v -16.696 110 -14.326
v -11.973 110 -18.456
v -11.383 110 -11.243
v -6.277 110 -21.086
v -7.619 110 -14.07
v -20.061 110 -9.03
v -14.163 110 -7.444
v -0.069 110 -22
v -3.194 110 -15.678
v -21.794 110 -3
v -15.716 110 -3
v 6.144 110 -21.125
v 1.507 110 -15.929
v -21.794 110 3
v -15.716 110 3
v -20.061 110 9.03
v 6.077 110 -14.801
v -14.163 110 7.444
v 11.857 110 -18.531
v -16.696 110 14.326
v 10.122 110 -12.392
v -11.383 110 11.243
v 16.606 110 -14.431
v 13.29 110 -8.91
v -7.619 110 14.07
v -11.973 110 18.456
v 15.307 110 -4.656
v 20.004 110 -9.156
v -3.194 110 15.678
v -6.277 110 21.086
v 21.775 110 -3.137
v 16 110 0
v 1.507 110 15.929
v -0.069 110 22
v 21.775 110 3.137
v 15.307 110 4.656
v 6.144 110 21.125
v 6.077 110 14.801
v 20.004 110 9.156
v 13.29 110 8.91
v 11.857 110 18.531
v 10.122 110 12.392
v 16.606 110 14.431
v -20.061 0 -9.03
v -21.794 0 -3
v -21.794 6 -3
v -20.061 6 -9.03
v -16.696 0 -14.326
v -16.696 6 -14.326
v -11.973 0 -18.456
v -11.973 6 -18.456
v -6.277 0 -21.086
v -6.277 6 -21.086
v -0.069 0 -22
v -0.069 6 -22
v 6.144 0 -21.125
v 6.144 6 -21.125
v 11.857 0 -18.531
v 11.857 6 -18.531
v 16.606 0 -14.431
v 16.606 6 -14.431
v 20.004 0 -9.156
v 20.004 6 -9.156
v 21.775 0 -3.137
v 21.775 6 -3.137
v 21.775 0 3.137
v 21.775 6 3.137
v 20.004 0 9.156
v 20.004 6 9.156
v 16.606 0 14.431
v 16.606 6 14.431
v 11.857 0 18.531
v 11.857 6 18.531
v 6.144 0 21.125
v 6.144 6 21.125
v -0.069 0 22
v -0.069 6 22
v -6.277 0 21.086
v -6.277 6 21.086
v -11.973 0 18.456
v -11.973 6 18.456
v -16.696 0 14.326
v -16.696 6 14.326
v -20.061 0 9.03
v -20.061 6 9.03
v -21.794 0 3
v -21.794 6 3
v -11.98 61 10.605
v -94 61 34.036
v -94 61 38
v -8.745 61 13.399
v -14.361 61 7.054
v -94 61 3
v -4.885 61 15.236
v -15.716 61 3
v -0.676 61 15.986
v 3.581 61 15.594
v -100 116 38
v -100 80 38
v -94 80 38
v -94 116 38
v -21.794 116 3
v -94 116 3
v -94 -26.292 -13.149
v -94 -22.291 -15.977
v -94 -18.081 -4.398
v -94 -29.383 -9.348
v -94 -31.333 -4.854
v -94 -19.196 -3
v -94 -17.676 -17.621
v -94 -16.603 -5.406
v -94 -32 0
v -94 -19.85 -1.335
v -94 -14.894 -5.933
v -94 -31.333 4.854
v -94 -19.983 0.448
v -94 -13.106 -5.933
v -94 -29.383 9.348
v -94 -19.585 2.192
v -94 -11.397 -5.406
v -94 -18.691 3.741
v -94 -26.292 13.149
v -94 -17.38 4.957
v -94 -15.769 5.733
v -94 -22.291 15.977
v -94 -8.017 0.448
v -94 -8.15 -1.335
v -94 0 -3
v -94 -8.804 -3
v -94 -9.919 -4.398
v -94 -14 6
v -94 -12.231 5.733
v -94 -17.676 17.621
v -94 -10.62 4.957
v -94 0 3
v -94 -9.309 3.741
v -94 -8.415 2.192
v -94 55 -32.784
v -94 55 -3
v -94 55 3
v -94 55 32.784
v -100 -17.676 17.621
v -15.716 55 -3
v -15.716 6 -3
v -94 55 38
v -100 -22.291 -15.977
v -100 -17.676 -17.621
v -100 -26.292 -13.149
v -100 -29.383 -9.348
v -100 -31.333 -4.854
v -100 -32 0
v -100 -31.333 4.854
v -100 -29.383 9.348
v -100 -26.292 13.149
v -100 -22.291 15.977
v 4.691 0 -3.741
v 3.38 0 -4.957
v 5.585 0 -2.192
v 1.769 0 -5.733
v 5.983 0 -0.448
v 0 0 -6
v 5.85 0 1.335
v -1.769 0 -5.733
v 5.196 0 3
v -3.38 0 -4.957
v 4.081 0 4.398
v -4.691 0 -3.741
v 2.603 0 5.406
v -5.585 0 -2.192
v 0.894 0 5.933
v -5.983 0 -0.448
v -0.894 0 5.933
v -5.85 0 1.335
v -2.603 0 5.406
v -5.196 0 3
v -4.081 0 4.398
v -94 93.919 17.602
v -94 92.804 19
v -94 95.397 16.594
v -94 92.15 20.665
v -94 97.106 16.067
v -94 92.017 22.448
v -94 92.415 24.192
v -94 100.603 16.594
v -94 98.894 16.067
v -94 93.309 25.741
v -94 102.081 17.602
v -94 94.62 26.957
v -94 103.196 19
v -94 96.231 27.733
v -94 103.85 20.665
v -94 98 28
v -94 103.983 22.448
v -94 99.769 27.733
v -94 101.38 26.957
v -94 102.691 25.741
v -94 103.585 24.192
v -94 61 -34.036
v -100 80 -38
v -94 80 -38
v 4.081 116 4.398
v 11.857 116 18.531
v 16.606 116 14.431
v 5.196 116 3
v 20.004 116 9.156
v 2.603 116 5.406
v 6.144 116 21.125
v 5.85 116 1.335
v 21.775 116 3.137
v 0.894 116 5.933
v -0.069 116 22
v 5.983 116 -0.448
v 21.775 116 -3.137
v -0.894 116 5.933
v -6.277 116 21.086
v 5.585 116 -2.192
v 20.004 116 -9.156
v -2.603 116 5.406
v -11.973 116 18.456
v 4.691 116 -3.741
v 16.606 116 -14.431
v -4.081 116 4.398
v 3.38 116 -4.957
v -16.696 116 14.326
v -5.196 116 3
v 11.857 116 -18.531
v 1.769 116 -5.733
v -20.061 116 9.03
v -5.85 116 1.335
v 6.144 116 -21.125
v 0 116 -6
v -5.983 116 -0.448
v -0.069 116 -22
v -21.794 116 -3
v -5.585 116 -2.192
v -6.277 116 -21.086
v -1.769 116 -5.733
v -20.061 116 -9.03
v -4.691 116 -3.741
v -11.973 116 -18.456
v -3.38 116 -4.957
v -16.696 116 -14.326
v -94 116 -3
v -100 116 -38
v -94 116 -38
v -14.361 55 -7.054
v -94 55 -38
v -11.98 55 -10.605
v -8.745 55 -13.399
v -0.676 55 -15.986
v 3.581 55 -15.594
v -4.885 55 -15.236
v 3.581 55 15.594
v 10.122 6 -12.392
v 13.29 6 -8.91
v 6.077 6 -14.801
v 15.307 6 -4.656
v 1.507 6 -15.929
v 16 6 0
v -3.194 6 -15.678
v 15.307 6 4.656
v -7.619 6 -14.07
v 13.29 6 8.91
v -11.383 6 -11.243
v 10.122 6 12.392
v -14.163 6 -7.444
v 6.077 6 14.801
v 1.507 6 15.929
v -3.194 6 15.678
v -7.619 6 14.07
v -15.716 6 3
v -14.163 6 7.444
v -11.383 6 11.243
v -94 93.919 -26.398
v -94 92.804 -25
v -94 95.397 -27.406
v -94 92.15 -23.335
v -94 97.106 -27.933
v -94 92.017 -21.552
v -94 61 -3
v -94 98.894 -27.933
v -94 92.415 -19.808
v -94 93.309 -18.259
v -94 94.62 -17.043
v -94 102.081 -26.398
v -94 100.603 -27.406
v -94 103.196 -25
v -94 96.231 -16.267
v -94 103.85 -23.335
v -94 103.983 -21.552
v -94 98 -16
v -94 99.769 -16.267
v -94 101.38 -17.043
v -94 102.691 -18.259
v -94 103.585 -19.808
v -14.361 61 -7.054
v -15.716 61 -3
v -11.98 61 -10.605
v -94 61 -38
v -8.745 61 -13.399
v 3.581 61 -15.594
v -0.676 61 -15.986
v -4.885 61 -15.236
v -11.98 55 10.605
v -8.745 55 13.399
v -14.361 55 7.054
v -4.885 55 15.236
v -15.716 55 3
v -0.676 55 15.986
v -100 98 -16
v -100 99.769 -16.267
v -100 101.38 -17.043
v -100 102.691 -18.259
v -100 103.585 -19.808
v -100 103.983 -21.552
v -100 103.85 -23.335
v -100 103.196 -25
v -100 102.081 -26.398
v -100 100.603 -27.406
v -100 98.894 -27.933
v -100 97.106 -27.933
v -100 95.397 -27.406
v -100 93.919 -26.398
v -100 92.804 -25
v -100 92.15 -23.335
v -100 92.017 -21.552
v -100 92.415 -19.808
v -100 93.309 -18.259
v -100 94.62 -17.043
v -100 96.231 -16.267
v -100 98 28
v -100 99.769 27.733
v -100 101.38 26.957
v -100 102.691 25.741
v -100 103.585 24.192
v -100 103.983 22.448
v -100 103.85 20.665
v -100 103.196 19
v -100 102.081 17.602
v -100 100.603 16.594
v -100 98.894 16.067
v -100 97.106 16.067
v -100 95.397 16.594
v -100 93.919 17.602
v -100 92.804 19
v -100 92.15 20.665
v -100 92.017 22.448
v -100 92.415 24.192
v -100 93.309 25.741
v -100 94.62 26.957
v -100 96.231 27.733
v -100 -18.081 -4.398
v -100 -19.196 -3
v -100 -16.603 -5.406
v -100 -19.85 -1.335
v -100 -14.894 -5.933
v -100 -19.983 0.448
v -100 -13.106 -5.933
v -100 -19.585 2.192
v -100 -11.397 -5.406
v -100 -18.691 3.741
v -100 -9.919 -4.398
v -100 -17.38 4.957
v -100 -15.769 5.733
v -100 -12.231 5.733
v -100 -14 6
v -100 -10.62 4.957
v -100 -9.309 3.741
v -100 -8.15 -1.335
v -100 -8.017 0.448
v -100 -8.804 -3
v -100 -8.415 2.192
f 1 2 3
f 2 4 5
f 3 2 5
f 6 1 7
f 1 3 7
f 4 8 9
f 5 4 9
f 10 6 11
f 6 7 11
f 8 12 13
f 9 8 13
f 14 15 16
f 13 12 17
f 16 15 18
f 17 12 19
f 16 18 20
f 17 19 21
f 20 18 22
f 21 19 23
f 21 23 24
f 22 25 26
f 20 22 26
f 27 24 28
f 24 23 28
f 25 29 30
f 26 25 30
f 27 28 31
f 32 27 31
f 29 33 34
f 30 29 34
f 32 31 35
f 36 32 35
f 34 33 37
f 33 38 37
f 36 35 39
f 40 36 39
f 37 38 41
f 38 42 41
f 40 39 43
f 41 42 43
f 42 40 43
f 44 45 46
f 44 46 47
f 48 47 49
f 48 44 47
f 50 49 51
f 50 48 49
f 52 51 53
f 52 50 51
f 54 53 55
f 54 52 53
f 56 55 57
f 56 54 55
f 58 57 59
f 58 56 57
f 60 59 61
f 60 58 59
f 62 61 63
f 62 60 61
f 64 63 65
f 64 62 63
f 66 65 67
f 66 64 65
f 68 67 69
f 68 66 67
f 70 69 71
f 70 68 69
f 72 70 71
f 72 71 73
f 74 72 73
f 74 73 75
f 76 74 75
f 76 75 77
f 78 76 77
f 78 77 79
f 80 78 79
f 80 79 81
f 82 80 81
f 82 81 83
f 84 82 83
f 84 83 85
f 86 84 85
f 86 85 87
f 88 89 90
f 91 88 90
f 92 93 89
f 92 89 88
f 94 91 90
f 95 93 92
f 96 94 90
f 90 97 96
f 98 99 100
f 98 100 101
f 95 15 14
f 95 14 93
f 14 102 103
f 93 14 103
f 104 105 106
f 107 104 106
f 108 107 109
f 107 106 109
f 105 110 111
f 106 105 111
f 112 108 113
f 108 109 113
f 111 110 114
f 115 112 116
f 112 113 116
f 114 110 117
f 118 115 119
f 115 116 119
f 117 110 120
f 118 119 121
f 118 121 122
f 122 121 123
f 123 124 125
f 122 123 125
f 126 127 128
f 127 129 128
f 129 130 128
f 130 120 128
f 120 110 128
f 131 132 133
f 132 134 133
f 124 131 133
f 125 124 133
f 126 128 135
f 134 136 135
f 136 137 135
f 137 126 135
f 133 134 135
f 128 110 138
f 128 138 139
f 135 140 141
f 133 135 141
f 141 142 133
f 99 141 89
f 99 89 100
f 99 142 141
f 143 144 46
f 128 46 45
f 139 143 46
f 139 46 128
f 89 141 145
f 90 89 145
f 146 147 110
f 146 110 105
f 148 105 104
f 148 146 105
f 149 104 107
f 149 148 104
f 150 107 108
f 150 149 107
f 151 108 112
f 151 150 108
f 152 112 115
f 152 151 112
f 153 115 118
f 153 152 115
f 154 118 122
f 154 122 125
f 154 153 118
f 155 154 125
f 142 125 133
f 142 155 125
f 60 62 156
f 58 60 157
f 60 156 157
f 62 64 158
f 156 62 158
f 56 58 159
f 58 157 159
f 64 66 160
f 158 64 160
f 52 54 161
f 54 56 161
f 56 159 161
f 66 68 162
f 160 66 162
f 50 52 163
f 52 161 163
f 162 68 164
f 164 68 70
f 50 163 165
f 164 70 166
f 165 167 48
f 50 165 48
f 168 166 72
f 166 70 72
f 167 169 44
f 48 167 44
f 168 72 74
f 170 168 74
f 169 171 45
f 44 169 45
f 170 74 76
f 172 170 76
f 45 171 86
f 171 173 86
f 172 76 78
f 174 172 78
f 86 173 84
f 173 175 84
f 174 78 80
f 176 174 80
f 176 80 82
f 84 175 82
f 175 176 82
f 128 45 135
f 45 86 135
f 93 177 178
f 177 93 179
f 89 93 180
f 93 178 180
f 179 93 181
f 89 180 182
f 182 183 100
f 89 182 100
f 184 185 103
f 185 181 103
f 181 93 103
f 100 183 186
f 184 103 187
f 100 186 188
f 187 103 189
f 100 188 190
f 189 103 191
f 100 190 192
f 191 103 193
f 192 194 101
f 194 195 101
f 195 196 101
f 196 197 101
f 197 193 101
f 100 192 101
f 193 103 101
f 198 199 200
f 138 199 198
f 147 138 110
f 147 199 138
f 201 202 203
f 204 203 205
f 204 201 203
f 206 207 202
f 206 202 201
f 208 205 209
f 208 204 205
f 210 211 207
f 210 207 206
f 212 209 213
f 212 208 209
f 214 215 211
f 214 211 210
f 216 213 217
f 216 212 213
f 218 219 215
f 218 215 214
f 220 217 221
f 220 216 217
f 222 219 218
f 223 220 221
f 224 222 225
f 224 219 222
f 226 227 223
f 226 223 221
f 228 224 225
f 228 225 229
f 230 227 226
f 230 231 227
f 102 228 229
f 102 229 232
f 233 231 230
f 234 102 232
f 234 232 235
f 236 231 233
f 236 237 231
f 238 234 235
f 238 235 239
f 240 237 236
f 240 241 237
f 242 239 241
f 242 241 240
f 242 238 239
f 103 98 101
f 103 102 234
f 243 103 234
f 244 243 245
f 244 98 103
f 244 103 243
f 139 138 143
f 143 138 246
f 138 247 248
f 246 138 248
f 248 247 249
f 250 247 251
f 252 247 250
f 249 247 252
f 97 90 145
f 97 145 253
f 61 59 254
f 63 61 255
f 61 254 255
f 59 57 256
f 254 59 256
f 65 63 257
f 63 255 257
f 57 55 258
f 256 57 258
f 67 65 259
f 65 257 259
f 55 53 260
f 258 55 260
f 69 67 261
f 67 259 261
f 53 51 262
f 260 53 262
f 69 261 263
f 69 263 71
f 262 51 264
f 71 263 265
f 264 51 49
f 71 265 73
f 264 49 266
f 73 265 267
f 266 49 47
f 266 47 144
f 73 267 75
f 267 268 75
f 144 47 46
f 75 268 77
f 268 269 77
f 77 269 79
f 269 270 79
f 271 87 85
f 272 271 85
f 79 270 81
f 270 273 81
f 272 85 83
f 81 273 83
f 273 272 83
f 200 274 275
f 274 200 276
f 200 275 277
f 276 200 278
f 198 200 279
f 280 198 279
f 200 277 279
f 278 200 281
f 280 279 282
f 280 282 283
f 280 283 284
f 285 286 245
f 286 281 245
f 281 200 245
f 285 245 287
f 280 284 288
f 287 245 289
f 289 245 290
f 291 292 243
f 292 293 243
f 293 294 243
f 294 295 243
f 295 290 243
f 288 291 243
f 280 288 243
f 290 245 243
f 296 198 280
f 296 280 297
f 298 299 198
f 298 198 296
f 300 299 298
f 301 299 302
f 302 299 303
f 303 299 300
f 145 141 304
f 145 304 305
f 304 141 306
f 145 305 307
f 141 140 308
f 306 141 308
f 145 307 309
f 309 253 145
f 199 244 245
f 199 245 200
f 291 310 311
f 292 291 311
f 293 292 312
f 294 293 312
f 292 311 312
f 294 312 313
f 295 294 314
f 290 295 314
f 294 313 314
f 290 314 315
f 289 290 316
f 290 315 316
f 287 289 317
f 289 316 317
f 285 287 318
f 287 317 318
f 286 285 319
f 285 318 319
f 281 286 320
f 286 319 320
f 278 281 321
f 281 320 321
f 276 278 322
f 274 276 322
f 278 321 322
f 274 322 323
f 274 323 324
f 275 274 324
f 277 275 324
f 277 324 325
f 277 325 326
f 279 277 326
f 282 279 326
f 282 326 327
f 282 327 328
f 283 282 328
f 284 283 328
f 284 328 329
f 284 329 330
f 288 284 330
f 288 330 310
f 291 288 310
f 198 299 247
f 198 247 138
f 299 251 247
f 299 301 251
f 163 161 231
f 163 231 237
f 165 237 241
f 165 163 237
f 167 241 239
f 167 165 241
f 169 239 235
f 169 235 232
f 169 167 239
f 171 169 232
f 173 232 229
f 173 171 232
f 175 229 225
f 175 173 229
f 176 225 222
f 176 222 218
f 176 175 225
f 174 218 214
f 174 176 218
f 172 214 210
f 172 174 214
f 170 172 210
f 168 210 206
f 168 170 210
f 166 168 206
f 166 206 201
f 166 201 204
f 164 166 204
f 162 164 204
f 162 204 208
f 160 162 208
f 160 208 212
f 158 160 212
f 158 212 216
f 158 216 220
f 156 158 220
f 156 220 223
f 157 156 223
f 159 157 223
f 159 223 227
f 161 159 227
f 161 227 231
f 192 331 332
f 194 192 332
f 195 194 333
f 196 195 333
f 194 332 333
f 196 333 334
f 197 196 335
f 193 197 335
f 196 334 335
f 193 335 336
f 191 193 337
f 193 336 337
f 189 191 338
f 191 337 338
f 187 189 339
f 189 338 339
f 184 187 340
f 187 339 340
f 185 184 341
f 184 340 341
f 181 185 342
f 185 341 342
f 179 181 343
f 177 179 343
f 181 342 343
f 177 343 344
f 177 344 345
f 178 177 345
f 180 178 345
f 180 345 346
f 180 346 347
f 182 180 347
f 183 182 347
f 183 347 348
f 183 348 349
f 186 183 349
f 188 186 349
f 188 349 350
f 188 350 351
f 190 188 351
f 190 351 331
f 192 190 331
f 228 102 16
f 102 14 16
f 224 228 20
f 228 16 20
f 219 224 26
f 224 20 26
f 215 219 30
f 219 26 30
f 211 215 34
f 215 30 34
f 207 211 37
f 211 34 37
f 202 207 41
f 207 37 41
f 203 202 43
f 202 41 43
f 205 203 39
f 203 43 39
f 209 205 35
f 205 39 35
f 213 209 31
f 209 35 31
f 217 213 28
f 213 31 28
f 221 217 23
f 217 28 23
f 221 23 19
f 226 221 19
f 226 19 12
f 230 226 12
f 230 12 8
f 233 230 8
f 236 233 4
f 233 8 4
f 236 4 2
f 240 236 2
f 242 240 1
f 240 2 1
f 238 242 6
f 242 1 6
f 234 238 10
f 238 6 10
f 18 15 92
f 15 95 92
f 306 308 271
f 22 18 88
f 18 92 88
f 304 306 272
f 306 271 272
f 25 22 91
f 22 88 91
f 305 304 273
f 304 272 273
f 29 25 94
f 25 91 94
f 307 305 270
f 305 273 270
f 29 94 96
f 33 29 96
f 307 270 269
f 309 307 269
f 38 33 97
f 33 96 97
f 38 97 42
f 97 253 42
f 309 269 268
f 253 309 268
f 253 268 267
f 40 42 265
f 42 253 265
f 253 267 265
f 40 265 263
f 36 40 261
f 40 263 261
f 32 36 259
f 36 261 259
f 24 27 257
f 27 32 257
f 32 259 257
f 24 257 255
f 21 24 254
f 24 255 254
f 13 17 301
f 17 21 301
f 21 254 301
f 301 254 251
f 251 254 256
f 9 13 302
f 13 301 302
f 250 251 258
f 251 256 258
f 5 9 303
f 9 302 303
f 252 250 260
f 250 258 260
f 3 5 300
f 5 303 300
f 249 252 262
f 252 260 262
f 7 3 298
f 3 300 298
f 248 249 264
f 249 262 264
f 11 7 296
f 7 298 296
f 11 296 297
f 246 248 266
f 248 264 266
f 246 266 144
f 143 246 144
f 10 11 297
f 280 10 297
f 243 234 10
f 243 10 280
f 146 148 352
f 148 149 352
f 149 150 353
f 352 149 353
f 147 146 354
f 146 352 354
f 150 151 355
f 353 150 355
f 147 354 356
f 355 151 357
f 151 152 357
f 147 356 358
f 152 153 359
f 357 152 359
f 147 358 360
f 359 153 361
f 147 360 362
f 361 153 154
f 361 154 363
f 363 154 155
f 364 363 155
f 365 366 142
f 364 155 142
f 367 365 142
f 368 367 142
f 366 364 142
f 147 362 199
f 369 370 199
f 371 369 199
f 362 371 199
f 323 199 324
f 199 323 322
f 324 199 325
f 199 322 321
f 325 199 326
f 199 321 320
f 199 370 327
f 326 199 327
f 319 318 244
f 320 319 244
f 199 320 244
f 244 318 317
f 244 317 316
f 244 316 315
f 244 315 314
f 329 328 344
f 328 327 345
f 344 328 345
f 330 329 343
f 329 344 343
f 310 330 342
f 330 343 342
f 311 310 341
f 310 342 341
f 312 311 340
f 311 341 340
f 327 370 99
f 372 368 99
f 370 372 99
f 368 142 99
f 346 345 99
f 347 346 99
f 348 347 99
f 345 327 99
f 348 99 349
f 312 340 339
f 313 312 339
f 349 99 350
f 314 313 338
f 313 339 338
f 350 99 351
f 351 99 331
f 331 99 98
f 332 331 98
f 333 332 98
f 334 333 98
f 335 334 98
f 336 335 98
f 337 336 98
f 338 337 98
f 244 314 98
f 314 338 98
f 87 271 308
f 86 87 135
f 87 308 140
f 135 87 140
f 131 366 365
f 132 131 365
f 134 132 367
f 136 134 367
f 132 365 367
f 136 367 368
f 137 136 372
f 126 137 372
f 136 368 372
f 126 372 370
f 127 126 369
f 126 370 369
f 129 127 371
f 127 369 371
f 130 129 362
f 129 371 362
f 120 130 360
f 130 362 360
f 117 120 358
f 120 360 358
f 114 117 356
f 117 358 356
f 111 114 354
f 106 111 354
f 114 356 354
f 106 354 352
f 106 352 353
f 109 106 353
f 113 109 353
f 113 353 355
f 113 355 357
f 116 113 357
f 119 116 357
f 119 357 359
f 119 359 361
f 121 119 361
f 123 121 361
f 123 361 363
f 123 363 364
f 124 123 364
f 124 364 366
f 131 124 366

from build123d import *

# Parameters (mm, degrees)
SKETCH1_R           = 16
SKETCH1_R_2         = 6
BOSS_EXTRUDE1_DEPTH = 116
BOSS_EXTRUDE2_START = -6
SKETCH2_R           = 22
SKETCH2_R_2         = 6
BOSS_EXTRUDE2_DEPTH = 6
SKETCH3_R           = 22
SKETCH3_R_2         = 6
BOSS_EXTRUDE3_DEPTH = 6
BOSS_EXTRUDE4_DEPTH = 6
BOSS_EXTRUDE7_DEPTH = 3
BOSS_EXTRUDE8_DEPTH = 3
HOLE1_D             = 12
HOLE2_D             = 12


with BuildPart() as part:
    # Sketch1 → Boss-Extrude1 (new body)
    with BuildSketch(Plane(origin=(0, 0, 0), x_dir=(1, 0, 0), z_dir=(0, 1, 0))):
        with Locations(Location((0, 0, 0), (0, 0, 90))):
            Circle(SKETCH1_R)
        with Locations(Location((0, 0, 0), (0, 0, 90))):
            Circle(SKETCH1_R_2, mode=Mode.SUBTRACT)
    extrude(amount=BOSS_EXTRUDE1_DEPTH)

    # Sketch2 → Boss-Extrude2 (add)
    with BuildSketch(Plane(origin=(0, 116, 0), x_dir=(1, 0, 0), z_dir=(0, 1, 0)).offset(BOSS_EXTRUDE2_START)):
        with Locations(Location((0, 0, 0), (0, 0, 270))):
            Circle(SKETCH2_R)
        with Locations(Location((0, 0, 0), (0, 0, 90))):
            Circle(SKETCH2_R_2, mode=Mode.SUBTRACT)
    extrude(amount=BOSS_EXTRUDE2_DEPTH)

    # Sketch3 → Boss-Extrude3 (add)
    with BuildSketch(Plane.XZ):
        with Locations(Location((0, 0, 0), (0, 0, 90))):
            Circle(SKETCH3_R)
        with Locations(Location((0, 0, 0), (0, 0, 270))):
            Circle(SKETCH3_R_2, mode=Mode.SUBTRACT)
    extrude(amount=-BOSS_EXTRUDE3_DEPTH)



with BuildPart() as body_2:
    # Sketch4 → Boss-Extrude4 (new body)
    with BuildSketch(Plane(origin=(-100, 0, 0), x_dir=(0, 0, -1), z_dir=(1, 0, 0))):
        with BuildLine():
            Line((-38, 116), (38, 116))
            Line((38, 116), (38, 80))
            Line((38, 80), (17.620559303, -17.676396314))
            ThreePointArc((17.620559303, -17.676396314), (0, -32), (-17.620559303, -17.676396314))
            Line((-17.620559303, -17.676396314), (-38, 80))
            Line((-38, 80), (-38, 116))
        make_face()
    extrude(amount=BOSS_EXTRUDE4_DEPTH)


with BuildPart() as part_1:
    add(part.part)

    add(body_2.part)  # Boss-Extrude7 merges body 2
    # Sketch5 → Boss-Extrude7 (add, symmetric)
    with BuildSketch(Plane.XY):
        Polygon((-100, 116), (-21, 116), (-21, 110), (-15, 110), (-15, 6), (-21, 6), (-21, 0), (-100, 0), align=None)
    extrude(amount=BOSS_EXTRUDE7_DEPTH, both=True)

    # Sketch6 → Boss-Extrude8 (add, symmetric)
    with BuildSketch(Plane(origin=(0, 58, 0), x_dir=(1, 0, 0), z_dir=(0, 1, 0))):
        with BuildLine():
            Line((-94, 38), (-94, -38))
            Line((-94, -38), (3.580633879, -15.594199596))
            ThreePointArc((3.580633879, -15.594199596), (-16, 0), (3.580633879, 15.594199596))
            Line((3.580633879, 15.594199596), (-94, 38))
        make_face()
    extrude(amount=BOSS_EXTRUDE8_DEPTH, both=True)

    # Hole1 (through all)
    with Locations(Plane(origin=(-94, 0, 0), x_dir=(0, 0, -1), z_dir=(1, 0, 0))):
        with Locations((0, -14), (-22, 98)):
            Hole(HOLE1_D / 2)

    # Hole2 (through all)
    with Locations(Plane(origin=(-94, 0, 0), x_dir=(0, 0, -1), z_dir=(1, 0, 0))):
        with Locations((22, 98)):
            Hole(HOLE2_D / 2)


solid = part_1.part
